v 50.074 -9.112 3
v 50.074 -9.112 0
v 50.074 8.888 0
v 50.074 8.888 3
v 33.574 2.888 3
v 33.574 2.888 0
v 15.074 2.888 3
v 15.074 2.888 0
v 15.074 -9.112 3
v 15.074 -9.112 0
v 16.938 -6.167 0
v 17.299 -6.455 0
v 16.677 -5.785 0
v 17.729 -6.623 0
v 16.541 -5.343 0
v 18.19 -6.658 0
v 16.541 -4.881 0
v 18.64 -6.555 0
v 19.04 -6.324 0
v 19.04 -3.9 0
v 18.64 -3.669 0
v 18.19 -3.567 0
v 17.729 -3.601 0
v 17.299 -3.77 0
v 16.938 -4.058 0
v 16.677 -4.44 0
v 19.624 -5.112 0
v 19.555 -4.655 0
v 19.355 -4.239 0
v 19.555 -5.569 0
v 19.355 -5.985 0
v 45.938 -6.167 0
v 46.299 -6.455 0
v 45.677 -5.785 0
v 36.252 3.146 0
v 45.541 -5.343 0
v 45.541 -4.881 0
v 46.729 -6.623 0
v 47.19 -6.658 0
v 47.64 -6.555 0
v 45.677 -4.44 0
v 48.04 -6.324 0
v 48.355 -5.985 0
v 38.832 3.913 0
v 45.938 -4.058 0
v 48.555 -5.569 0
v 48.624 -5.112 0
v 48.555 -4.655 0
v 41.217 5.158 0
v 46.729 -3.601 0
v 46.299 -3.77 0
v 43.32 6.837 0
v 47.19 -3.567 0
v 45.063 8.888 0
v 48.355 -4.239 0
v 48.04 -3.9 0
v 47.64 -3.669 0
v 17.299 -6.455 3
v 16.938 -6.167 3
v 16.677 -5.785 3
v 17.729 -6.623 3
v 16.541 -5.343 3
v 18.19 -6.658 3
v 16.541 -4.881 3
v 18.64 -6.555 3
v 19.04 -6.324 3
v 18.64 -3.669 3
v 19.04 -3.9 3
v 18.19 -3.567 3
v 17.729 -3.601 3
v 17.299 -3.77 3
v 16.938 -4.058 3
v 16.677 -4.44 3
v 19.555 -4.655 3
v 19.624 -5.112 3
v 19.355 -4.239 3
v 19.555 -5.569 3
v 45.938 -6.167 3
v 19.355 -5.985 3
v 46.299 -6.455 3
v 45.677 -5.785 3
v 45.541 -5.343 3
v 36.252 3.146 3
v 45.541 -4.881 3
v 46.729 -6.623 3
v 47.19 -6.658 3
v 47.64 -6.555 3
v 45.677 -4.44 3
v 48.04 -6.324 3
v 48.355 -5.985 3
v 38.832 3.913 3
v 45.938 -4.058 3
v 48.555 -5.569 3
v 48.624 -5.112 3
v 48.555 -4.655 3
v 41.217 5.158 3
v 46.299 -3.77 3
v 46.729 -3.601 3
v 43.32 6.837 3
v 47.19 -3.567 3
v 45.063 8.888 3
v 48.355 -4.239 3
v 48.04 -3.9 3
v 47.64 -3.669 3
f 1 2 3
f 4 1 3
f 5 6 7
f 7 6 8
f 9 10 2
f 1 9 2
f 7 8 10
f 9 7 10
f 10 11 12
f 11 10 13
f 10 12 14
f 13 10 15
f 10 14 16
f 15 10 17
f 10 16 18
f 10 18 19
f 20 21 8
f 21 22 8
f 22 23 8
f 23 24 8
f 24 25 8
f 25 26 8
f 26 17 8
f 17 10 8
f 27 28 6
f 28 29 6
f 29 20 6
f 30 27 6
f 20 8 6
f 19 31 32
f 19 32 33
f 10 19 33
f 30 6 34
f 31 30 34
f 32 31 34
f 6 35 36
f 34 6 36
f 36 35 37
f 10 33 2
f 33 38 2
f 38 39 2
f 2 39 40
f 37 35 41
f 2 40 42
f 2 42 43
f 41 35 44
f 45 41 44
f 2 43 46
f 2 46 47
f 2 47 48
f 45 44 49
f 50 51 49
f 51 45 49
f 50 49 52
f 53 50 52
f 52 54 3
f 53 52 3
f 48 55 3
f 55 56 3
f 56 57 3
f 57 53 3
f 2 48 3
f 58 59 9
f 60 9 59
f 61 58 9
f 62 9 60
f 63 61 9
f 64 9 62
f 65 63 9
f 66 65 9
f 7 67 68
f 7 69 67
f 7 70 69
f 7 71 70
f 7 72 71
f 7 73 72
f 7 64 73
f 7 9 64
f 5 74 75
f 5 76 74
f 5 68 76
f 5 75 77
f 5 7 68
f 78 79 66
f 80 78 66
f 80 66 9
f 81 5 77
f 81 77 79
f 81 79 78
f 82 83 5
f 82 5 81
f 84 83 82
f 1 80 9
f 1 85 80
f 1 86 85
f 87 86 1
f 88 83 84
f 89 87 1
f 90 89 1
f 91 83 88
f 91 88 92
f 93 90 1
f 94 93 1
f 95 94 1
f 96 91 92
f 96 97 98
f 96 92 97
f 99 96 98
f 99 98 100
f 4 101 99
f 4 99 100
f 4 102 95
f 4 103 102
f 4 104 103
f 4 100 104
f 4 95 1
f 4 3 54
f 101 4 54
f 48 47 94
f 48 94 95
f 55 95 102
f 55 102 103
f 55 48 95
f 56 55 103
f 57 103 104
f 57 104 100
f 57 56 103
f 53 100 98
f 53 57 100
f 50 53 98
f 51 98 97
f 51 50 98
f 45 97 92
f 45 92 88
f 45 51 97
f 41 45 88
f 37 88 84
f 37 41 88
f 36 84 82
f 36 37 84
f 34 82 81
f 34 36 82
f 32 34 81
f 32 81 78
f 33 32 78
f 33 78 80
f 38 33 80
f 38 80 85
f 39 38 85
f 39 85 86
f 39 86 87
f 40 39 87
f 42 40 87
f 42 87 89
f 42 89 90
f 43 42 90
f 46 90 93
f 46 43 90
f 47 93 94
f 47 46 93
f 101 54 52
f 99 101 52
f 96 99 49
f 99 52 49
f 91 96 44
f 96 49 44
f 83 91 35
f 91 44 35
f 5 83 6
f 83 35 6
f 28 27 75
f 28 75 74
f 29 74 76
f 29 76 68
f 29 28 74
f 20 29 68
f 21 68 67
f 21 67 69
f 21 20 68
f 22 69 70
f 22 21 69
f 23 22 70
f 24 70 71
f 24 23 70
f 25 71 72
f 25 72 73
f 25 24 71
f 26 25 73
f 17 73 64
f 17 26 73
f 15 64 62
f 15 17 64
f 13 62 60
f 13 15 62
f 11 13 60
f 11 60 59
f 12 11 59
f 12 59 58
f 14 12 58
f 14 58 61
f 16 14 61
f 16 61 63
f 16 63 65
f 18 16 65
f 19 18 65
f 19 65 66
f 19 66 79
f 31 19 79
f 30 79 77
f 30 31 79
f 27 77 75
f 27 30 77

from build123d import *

# Parameters (mm, degrees)
SKETCH1_R           = 1.55
BOSS_EXTRUDE1_DEPTH = 3


with BuildPart() as part:
    # Sketch1 → Boss-Extrude1 (new body)
    with BuildSketch(Plane.XY):
        with BuildLine():
            Line((46.57384356, 8.887676402), (45.062968853, 8.887676402))
            ThreePointArc((45.062968853, 8.887676402), (40.054584258, 4.478002756), (33.57384356, 2.887676402))
            Line((33.57384356, 2.887676402), (15.07384356, 2.887676402))
            Line((15.07384356, 2.887676402), (15.07384356, 0.887676439))
            Line((15.07384356, 0.887676439), (15.07384356, -1.112323636))
            Line((15.07384356, -1.112323636), (15.07384356, -9.112323598))
            Line((15.07384356, -9.112323598), (50.07384356, -9.112323598))
            Line((50.07384356, -9.112323598), (50.07384356, 8.887676402))
            Line((50.07384356, 8.887676402), (48.573843574, 8.887676402))
            Line((48.573843574, 8.887676402), (46.57384356, 8.887676402))
        make_face()
        with Locations((18.07384356, -5.112323598)):
            Circle(SKETCH1_R, mode=Mode.SUBTRACT)
        with Locations((47.07384356, -5.112323598)):
            Circle(SKETCH1_R, mode=Mode.SUBTRACT)
    extrude(amount=BOSS_EXTRUDE1_DEPTH)


solid = part.part
